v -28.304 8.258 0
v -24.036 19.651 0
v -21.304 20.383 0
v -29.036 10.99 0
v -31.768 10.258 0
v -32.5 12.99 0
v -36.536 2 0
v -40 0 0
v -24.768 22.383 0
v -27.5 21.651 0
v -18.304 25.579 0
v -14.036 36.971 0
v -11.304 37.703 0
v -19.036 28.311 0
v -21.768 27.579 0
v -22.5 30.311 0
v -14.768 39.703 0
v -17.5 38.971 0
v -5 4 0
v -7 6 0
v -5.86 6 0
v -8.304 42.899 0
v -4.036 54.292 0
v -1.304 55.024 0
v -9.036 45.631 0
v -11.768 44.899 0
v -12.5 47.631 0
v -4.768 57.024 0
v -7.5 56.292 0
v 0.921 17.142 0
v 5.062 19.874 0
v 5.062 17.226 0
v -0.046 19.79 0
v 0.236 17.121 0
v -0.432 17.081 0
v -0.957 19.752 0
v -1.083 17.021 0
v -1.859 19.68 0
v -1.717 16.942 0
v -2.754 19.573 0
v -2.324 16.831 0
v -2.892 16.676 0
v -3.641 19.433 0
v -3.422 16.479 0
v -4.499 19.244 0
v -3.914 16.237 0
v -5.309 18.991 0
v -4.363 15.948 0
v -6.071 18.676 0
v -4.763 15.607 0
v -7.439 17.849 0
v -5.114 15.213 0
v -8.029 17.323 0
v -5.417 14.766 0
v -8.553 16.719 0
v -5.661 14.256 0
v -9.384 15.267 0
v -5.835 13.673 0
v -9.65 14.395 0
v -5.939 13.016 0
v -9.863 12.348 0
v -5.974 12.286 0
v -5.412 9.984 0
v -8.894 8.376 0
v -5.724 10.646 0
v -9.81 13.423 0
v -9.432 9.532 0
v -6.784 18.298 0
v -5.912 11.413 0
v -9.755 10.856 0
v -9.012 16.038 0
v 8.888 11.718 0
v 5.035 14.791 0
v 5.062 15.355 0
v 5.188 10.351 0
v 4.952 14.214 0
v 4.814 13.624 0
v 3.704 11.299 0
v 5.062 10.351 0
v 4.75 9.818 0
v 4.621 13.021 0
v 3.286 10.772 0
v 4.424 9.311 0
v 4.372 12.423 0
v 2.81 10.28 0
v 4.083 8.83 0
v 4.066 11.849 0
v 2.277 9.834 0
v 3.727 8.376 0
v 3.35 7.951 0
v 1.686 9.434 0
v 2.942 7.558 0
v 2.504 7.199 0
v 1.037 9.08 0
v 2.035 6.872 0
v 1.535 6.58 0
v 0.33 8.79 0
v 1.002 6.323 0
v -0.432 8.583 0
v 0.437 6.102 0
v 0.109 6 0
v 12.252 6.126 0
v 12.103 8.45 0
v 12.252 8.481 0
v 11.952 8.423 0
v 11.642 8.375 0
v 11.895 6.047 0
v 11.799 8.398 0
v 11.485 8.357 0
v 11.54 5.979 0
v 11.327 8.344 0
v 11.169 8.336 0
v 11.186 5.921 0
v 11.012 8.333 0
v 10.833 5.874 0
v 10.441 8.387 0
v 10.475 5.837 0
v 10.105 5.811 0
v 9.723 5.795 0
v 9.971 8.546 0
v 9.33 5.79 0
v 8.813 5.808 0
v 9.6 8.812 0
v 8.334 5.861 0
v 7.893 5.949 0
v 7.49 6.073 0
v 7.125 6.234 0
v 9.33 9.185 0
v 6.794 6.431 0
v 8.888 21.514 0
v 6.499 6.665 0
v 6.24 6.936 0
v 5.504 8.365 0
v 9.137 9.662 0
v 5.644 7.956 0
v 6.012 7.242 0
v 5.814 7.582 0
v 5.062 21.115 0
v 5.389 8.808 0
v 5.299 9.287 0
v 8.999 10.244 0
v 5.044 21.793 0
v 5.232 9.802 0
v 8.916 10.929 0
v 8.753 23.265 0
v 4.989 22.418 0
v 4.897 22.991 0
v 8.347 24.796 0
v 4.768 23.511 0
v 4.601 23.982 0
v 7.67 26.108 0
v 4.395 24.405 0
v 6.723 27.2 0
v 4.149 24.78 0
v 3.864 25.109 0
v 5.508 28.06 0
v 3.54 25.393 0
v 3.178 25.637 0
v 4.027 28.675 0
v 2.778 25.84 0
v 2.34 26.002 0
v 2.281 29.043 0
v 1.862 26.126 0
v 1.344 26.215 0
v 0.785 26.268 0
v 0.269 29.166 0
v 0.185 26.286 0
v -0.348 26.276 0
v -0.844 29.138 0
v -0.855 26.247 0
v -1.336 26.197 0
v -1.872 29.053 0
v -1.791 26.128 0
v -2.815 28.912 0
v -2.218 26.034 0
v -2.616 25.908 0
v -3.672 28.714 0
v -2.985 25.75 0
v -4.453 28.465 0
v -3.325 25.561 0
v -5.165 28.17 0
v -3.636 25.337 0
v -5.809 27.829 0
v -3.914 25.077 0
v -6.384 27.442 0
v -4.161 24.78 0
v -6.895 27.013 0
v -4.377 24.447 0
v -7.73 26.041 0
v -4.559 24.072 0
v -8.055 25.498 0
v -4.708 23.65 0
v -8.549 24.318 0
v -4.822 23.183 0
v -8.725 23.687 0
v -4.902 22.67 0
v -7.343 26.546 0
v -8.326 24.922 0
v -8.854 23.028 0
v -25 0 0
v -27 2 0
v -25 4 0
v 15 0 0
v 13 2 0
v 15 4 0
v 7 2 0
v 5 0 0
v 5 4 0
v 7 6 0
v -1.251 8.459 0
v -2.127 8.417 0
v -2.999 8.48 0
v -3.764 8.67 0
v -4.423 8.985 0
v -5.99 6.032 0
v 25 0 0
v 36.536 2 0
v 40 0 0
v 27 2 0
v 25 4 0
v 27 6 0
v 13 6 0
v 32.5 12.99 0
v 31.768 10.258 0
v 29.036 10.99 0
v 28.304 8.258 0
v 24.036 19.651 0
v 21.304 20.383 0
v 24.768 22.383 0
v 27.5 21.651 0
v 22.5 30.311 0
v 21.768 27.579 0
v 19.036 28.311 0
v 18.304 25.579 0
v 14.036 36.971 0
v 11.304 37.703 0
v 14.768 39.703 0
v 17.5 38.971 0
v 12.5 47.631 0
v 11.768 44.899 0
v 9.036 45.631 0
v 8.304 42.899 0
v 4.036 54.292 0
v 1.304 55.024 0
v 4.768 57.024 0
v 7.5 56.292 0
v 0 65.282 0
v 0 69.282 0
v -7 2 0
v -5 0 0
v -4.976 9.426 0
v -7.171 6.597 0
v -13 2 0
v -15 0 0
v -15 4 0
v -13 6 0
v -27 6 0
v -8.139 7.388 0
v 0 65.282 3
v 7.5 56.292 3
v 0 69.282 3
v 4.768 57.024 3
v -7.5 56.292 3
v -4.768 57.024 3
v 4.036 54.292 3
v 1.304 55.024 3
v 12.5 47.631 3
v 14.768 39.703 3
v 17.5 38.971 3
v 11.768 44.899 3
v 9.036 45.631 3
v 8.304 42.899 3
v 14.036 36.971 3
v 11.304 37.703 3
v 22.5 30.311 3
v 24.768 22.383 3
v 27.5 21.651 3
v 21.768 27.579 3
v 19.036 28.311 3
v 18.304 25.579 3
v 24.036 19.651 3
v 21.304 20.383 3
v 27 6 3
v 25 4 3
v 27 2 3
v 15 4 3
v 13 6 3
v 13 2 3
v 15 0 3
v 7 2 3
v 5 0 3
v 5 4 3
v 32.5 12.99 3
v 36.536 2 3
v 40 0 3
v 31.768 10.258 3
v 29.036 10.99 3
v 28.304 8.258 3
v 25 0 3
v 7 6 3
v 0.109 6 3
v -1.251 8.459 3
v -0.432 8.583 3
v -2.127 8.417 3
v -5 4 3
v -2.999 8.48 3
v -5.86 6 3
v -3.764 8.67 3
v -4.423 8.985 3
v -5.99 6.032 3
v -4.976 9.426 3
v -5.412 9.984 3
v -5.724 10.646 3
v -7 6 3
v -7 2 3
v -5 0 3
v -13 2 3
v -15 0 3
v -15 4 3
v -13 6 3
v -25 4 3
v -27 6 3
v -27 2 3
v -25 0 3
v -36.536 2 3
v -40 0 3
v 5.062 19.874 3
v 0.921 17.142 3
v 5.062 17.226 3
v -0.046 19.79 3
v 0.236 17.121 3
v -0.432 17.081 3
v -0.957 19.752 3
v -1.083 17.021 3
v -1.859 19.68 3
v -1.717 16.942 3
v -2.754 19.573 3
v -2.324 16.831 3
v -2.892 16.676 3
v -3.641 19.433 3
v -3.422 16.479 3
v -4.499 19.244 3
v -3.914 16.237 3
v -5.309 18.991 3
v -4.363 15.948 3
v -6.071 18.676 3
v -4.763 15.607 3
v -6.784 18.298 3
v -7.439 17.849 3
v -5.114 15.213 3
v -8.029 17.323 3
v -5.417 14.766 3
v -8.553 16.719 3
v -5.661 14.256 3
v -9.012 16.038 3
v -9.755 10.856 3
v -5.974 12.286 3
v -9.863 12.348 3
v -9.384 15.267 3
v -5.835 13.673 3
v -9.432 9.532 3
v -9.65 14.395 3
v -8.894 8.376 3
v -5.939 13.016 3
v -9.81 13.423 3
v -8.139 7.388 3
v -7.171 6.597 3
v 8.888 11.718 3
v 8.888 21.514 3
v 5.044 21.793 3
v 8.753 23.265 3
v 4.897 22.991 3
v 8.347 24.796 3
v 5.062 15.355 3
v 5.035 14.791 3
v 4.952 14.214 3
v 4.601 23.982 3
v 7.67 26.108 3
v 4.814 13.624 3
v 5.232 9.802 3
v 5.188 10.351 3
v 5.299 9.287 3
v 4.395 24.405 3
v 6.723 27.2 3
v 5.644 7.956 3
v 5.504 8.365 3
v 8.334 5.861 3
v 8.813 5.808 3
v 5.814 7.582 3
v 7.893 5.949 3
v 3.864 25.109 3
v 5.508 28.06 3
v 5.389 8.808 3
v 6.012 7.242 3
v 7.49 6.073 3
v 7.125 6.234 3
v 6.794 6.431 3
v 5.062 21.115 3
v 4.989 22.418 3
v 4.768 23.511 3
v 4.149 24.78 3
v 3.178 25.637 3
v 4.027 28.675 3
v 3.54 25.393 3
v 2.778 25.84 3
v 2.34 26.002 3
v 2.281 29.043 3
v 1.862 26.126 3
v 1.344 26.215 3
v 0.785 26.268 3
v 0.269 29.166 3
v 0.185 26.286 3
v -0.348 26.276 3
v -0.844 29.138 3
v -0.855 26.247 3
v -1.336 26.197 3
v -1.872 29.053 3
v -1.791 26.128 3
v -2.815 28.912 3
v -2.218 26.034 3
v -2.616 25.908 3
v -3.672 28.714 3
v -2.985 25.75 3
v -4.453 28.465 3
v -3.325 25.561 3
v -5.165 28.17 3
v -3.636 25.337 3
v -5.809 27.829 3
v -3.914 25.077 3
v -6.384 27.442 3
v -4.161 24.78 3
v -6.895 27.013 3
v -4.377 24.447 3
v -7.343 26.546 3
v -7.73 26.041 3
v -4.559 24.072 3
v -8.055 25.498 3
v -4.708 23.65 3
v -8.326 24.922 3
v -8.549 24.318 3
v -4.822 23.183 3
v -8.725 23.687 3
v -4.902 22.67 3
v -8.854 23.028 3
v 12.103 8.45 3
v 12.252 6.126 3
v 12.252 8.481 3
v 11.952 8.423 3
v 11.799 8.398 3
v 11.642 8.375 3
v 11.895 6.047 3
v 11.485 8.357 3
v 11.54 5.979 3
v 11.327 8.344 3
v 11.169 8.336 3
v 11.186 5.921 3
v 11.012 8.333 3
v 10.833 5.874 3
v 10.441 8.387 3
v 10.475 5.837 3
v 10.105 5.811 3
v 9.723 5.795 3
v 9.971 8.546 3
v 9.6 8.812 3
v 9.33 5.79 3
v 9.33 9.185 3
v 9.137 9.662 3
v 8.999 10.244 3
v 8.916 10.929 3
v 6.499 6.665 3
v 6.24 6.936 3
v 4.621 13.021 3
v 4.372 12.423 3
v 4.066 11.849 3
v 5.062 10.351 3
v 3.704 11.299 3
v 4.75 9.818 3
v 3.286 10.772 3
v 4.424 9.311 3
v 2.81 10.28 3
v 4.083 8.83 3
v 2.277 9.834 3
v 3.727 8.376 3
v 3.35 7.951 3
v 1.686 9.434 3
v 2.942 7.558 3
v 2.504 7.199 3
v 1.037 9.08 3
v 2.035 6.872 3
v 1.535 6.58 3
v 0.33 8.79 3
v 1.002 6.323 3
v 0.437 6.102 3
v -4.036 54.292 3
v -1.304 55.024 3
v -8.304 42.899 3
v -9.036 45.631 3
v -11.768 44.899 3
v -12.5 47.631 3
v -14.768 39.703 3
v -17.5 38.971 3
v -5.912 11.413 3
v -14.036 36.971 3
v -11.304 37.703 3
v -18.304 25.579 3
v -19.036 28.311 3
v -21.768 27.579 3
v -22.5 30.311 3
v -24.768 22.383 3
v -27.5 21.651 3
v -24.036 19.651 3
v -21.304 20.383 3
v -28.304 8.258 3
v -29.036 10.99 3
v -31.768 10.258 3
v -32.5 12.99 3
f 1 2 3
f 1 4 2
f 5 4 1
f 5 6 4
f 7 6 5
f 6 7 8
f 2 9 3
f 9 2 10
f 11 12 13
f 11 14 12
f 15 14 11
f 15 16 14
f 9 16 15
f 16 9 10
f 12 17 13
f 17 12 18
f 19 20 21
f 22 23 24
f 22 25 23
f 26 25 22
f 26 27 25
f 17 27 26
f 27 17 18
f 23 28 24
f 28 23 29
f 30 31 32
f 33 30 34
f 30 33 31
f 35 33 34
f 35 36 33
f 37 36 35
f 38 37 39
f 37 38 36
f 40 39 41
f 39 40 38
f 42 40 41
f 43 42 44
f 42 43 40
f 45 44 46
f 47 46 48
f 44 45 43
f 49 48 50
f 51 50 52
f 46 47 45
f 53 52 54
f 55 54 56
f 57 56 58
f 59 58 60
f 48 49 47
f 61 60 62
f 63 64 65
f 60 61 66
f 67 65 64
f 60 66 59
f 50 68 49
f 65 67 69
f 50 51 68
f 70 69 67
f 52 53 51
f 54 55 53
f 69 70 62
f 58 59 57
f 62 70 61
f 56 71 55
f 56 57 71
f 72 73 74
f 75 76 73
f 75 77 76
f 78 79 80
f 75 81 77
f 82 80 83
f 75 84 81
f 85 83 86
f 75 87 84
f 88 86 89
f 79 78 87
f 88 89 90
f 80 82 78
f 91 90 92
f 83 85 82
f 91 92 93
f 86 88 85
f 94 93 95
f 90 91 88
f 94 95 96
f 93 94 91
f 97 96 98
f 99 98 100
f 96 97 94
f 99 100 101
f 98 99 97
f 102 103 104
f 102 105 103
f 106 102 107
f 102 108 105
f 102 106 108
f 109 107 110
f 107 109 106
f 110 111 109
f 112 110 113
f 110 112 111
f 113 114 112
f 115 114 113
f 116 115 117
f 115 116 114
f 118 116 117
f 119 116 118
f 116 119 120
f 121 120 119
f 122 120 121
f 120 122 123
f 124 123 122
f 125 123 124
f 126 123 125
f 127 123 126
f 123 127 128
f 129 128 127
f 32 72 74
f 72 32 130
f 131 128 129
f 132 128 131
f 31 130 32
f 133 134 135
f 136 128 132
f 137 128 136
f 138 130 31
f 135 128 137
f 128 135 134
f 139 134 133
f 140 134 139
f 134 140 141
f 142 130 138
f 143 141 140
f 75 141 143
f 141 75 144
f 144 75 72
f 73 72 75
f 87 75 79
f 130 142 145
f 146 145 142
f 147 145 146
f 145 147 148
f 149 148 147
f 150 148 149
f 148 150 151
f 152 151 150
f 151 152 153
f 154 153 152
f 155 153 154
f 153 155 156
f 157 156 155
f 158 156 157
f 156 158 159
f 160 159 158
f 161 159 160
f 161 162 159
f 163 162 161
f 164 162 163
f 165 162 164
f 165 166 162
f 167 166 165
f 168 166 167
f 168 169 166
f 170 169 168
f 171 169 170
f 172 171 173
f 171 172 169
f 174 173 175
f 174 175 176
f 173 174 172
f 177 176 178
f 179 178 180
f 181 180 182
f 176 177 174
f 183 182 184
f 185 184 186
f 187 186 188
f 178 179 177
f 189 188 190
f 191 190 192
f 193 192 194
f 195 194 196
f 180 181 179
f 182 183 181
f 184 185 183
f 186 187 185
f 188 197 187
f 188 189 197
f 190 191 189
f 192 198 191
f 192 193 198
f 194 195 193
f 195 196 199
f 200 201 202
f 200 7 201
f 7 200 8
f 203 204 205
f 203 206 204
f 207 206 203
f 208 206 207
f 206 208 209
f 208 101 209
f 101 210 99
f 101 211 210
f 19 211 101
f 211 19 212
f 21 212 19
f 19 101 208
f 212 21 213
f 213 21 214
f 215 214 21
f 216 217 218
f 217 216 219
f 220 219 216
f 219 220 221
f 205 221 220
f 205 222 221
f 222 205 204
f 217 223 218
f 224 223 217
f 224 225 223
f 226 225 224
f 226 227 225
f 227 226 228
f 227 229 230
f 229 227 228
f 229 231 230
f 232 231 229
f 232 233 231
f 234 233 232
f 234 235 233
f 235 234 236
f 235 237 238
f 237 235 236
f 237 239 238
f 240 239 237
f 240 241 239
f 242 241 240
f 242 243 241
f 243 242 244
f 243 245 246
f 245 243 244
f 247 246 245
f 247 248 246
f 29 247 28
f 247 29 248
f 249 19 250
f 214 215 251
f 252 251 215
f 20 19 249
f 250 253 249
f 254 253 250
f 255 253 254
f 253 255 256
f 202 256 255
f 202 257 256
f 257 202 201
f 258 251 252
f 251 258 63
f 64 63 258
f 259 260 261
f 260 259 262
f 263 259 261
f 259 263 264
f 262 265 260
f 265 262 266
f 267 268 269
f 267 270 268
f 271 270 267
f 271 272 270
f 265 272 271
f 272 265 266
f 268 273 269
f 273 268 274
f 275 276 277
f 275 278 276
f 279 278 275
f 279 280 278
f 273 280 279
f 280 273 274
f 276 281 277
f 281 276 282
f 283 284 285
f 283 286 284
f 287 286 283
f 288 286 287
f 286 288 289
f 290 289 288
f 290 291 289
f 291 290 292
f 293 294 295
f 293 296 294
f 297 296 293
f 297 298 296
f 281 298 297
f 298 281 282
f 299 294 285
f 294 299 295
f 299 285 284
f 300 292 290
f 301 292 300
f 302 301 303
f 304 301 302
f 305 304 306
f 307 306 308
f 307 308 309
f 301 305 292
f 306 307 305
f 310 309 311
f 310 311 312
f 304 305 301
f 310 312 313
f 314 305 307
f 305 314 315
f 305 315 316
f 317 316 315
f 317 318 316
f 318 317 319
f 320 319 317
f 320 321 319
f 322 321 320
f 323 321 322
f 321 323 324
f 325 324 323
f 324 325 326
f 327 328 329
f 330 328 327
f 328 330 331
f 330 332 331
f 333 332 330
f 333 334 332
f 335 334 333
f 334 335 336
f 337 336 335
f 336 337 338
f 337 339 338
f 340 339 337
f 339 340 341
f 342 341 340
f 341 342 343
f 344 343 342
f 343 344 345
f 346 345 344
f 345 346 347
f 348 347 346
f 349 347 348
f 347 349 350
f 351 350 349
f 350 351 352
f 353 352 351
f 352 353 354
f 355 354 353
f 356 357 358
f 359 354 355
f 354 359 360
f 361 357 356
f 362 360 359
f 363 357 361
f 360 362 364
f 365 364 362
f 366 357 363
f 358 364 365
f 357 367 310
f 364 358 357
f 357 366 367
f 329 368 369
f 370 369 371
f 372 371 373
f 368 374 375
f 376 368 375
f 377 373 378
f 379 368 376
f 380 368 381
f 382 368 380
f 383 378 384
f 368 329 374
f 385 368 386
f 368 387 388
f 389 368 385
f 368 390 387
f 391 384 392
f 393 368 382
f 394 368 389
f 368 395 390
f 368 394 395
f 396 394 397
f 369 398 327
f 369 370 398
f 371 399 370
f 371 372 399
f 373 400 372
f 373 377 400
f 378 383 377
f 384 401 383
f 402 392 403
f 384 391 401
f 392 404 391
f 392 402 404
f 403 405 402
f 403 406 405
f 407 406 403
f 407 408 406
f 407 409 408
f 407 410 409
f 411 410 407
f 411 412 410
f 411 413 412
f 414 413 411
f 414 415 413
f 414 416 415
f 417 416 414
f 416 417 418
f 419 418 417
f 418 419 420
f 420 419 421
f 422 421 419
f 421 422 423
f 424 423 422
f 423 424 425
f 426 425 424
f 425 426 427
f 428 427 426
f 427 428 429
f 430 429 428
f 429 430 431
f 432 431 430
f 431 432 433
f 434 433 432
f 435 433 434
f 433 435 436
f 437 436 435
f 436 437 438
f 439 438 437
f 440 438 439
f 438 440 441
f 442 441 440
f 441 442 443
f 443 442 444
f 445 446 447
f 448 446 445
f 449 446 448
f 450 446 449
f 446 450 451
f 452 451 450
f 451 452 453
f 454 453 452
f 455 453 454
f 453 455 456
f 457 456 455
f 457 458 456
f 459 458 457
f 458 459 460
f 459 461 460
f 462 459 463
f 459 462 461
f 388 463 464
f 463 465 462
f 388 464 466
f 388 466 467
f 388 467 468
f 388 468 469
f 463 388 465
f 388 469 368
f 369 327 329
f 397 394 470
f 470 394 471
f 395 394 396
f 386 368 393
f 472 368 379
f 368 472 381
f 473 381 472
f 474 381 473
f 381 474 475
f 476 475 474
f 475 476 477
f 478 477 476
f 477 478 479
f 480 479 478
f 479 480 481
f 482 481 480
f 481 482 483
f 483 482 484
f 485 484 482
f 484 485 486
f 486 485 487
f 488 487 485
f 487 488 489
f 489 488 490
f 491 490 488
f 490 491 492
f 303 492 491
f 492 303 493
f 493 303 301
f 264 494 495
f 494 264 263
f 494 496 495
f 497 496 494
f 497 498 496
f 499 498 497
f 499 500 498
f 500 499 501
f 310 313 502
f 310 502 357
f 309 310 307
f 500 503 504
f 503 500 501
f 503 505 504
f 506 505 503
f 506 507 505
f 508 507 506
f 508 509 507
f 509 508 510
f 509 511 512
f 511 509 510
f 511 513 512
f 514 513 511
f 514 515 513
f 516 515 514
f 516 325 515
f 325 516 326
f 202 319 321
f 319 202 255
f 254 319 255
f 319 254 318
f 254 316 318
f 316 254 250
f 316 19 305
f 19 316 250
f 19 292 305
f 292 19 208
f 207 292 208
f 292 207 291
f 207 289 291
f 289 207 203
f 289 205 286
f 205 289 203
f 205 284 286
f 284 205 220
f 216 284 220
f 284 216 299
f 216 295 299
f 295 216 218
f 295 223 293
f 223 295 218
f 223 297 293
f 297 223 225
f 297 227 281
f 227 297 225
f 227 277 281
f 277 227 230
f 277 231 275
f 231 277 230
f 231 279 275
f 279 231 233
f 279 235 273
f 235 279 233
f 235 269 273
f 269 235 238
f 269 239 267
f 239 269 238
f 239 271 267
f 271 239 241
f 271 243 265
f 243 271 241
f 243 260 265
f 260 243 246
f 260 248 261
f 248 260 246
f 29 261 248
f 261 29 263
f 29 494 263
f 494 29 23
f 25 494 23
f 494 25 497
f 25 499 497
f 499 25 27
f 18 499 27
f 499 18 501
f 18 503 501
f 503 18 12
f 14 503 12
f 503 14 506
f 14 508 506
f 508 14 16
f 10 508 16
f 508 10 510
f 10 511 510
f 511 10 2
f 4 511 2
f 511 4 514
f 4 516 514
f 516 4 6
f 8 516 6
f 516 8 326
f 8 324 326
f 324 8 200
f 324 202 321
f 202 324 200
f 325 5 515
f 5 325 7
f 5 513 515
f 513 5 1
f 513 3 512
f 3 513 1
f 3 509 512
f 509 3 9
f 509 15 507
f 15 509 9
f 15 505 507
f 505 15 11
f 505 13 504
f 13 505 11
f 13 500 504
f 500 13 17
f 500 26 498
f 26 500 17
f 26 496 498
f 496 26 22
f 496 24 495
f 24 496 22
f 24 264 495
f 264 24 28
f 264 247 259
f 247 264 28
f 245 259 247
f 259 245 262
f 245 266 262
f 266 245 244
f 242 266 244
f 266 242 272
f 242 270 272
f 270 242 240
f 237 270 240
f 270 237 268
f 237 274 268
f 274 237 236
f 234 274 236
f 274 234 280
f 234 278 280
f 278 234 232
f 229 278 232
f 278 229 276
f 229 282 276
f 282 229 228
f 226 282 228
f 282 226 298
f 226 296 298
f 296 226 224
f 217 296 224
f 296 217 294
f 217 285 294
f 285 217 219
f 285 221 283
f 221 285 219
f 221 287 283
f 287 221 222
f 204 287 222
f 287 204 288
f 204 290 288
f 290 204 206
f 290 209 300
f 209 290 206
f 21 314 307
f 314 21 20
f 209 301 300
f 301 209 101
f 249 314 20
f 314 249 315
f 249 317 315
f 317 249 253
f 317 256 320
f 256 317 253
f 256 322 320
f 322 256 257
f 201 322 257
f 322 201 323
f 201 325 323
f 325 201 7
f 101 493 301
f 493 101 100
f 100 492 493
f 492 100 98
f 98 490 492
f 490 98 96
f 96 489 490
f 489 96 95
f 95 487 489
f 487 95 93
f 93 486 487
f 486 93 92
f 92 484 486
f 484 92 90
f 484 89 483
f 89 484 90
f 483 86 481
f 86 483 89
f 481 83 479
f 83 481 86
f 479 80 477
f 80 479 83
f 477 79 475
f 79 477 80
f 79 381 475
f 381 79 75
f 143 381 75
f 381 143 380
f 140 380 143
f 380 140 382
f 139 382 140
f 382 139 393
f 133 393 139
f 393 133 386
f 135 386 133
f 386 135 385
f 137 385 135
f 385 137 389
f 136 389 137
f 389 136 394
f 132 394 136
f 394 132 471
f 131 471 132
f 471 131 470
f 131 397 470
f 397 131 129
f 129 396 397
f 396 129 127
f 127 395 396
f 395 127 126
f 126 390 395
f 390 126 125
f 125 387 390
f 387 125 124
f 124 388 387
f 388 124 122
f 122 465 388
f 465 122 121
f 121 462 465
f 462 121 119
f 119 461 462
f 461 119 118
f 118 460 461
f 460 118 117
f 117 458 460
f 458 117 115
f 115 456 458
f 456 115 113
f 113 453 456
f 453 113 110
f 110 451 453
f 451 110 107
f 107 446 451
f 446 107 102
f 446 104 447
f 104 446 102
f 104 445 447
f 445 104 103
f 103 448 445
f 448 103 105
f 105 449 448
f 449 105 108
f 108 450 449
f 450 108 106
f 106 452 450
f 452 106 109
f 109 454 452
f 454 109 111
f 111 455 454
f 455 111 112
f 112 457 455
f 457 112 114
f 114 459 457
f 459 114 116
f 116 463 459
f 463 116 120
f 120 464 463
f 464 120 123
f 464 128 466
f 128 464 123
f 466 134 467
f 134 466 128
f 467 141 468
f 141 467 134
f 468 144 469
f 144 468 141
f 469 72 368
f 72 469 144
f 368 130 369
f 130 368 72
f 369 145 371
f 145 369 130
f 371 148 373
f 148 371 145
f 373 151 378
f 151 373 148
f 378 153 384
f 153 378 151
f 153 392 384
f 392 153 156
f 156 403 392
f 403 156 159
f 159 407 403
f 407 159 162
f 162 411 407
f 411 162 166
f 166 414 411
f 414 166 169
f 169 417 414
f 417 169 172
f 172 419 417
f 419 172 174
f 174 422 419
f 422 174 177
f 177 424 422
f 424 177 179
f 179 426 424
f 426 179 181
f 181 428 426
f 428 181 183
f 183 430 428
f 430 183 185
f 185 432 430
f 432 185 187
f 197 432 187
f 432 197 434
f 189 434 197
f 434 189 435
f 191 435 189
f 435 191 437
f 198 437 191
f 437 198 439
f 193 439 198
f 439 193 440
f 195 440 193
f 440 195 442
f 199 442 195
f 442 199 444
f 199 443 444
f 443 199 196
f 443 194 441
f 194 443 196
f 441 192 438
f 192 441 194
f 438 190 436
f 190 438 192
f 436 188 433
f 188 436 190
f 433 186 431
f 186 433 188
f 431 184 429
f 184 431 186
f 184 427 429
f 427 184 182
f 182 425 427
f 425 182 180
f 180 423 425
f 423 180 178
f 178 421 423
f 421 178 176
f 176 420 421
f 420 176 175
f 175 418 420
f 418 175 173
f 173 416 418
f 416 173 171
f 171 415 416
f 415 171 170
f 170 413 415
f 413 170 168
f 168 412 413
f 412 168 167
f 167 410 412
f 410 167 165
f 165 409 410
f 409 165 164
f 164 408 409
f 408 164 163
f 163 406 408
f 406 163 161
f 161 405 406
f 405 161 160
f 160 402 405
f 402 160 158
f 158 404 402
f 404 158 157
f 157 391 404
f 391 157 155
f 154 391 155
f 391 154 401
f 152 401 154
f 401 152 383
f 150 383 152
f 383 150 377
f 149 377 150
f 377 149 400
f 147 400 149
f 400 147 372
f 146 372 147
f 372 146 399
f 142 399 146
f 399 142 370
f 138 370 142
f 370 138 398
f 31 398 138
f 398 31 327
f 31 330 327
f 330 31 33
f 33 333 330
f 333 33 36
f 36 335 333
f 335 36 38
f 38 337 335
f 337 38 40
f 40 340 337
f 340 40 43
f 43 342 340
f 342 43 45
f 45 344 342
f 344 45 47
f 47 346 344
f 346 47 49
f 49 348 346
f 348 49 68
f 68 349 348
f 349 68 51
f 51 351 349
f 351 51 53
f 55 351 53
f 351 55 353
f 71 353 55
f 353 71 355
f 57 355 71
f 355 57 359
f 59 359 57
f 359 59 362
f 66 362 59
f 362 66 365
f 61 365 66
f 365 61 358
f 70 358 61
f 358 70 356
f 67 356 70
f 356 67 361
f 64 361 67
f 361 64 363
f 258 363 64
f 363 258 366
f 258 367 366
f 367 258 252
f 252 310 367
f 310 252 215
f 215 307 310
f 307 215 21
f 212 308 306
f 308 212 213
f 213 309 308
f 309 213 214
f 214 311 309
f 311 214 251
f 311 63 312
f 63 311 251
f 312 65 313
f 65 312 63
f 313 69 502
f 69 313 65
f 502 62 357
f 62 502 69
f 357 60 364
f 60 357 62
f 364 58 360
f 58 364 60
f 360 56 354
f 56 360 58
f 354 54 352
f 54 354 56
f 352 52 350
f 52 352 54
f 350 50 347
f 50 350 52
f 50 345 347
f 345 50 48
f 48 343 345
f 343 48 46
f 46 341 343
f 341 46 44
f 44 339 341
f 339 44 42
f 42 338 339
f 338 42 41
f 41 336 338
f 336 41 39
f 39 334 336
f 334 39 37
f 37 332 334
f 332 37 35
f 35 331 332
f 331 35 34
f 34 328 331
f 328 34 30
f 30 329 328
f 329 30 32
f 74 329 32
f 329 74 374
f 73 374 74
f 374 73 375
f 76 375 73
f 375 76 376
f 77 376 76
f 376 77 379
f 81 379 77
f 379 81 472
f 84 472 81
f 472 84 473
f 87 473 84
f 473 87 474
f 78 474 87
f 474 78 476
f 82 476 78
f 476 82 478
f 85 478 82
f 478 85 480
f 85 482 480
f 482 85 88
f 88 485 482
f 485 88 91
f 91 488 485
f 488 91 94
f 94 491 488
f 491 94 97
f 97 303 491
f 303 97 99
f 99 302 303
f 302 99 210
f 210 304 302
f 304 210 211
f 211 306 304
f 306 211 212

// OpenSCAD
/* 
 * Stackenlichten-Files I: The top plate
 *
 * kellertuer, 2017-02-19
 */

/*
 * Variables, all Data in mm
 */
wW      = 4;  // Thickness/Width of wood
mW    = 4;   //                 of a Magnet-Cube
fW     = 3; // Thickness of the front plastic plate
sL = 80;    // sidelength of a triangle
bD = 80;   // Depth of a box (depth w.r.t. frontview)
fC = 3; // number of fingers
// don't change these values
nD = 2*fC+2; //number of Divisions, due to 2fC+1 segments and one segment that split in the corners

// concat with shfted rotated versions... bottom left right

// Generate triangle
PointLine = concat(genSide(),genSide(-120,[sL/4,sL*sqrt(3)/4]),genSide(120,[-sL/4,sL*sqrt(3)/4]));

linear_extrude(height=fW, twist=0)
union() {
    difference() {
        polygon(points=PointLine);
        offset(delta=-2) polygon(points=PointLine);
    };
}
linear_extrude(height=fW, twist=0)
translate([-.0,1.5*wW,0])
     text("a",font="Helvetica",size=31,halign="center");
//translate([-2,sL*sqrt(3)/8+1.8,.5])
//   cube([14,1,1],center=true);
/*
 * Helping Functions - Generate one side of the triangle recursion olé olé
 */
function genSide(a=0,v=[0,0]) = generateSide([rotM(a)*[-sL/2,0]+v],0,a,v);   
//Recursively generate fC toothes
function generateSide(pL,i,a,v) = (i==fC) ? concat(pL,[rotM(a)*[sL/2,0]+v])
    : generateSide(concat(pL,[
        rotM(a)*[-sL/2+(2*i+1.5)*sL/nD,0]+v, rotM(a)*[-sL/2+(2*i+1.5)*sL/nD,wW]+v,
        rotM(a)*[-sL/2+(2*i+2.5)*sL/nD,wW]+v, rotM(a)*[-sL/2+(2*i+2.5)*sL/nD,0]+v]),i+1,a,v);
function rotM(a) = [[cos(a),sin(a)],[-sin(a),cos(a)]];
